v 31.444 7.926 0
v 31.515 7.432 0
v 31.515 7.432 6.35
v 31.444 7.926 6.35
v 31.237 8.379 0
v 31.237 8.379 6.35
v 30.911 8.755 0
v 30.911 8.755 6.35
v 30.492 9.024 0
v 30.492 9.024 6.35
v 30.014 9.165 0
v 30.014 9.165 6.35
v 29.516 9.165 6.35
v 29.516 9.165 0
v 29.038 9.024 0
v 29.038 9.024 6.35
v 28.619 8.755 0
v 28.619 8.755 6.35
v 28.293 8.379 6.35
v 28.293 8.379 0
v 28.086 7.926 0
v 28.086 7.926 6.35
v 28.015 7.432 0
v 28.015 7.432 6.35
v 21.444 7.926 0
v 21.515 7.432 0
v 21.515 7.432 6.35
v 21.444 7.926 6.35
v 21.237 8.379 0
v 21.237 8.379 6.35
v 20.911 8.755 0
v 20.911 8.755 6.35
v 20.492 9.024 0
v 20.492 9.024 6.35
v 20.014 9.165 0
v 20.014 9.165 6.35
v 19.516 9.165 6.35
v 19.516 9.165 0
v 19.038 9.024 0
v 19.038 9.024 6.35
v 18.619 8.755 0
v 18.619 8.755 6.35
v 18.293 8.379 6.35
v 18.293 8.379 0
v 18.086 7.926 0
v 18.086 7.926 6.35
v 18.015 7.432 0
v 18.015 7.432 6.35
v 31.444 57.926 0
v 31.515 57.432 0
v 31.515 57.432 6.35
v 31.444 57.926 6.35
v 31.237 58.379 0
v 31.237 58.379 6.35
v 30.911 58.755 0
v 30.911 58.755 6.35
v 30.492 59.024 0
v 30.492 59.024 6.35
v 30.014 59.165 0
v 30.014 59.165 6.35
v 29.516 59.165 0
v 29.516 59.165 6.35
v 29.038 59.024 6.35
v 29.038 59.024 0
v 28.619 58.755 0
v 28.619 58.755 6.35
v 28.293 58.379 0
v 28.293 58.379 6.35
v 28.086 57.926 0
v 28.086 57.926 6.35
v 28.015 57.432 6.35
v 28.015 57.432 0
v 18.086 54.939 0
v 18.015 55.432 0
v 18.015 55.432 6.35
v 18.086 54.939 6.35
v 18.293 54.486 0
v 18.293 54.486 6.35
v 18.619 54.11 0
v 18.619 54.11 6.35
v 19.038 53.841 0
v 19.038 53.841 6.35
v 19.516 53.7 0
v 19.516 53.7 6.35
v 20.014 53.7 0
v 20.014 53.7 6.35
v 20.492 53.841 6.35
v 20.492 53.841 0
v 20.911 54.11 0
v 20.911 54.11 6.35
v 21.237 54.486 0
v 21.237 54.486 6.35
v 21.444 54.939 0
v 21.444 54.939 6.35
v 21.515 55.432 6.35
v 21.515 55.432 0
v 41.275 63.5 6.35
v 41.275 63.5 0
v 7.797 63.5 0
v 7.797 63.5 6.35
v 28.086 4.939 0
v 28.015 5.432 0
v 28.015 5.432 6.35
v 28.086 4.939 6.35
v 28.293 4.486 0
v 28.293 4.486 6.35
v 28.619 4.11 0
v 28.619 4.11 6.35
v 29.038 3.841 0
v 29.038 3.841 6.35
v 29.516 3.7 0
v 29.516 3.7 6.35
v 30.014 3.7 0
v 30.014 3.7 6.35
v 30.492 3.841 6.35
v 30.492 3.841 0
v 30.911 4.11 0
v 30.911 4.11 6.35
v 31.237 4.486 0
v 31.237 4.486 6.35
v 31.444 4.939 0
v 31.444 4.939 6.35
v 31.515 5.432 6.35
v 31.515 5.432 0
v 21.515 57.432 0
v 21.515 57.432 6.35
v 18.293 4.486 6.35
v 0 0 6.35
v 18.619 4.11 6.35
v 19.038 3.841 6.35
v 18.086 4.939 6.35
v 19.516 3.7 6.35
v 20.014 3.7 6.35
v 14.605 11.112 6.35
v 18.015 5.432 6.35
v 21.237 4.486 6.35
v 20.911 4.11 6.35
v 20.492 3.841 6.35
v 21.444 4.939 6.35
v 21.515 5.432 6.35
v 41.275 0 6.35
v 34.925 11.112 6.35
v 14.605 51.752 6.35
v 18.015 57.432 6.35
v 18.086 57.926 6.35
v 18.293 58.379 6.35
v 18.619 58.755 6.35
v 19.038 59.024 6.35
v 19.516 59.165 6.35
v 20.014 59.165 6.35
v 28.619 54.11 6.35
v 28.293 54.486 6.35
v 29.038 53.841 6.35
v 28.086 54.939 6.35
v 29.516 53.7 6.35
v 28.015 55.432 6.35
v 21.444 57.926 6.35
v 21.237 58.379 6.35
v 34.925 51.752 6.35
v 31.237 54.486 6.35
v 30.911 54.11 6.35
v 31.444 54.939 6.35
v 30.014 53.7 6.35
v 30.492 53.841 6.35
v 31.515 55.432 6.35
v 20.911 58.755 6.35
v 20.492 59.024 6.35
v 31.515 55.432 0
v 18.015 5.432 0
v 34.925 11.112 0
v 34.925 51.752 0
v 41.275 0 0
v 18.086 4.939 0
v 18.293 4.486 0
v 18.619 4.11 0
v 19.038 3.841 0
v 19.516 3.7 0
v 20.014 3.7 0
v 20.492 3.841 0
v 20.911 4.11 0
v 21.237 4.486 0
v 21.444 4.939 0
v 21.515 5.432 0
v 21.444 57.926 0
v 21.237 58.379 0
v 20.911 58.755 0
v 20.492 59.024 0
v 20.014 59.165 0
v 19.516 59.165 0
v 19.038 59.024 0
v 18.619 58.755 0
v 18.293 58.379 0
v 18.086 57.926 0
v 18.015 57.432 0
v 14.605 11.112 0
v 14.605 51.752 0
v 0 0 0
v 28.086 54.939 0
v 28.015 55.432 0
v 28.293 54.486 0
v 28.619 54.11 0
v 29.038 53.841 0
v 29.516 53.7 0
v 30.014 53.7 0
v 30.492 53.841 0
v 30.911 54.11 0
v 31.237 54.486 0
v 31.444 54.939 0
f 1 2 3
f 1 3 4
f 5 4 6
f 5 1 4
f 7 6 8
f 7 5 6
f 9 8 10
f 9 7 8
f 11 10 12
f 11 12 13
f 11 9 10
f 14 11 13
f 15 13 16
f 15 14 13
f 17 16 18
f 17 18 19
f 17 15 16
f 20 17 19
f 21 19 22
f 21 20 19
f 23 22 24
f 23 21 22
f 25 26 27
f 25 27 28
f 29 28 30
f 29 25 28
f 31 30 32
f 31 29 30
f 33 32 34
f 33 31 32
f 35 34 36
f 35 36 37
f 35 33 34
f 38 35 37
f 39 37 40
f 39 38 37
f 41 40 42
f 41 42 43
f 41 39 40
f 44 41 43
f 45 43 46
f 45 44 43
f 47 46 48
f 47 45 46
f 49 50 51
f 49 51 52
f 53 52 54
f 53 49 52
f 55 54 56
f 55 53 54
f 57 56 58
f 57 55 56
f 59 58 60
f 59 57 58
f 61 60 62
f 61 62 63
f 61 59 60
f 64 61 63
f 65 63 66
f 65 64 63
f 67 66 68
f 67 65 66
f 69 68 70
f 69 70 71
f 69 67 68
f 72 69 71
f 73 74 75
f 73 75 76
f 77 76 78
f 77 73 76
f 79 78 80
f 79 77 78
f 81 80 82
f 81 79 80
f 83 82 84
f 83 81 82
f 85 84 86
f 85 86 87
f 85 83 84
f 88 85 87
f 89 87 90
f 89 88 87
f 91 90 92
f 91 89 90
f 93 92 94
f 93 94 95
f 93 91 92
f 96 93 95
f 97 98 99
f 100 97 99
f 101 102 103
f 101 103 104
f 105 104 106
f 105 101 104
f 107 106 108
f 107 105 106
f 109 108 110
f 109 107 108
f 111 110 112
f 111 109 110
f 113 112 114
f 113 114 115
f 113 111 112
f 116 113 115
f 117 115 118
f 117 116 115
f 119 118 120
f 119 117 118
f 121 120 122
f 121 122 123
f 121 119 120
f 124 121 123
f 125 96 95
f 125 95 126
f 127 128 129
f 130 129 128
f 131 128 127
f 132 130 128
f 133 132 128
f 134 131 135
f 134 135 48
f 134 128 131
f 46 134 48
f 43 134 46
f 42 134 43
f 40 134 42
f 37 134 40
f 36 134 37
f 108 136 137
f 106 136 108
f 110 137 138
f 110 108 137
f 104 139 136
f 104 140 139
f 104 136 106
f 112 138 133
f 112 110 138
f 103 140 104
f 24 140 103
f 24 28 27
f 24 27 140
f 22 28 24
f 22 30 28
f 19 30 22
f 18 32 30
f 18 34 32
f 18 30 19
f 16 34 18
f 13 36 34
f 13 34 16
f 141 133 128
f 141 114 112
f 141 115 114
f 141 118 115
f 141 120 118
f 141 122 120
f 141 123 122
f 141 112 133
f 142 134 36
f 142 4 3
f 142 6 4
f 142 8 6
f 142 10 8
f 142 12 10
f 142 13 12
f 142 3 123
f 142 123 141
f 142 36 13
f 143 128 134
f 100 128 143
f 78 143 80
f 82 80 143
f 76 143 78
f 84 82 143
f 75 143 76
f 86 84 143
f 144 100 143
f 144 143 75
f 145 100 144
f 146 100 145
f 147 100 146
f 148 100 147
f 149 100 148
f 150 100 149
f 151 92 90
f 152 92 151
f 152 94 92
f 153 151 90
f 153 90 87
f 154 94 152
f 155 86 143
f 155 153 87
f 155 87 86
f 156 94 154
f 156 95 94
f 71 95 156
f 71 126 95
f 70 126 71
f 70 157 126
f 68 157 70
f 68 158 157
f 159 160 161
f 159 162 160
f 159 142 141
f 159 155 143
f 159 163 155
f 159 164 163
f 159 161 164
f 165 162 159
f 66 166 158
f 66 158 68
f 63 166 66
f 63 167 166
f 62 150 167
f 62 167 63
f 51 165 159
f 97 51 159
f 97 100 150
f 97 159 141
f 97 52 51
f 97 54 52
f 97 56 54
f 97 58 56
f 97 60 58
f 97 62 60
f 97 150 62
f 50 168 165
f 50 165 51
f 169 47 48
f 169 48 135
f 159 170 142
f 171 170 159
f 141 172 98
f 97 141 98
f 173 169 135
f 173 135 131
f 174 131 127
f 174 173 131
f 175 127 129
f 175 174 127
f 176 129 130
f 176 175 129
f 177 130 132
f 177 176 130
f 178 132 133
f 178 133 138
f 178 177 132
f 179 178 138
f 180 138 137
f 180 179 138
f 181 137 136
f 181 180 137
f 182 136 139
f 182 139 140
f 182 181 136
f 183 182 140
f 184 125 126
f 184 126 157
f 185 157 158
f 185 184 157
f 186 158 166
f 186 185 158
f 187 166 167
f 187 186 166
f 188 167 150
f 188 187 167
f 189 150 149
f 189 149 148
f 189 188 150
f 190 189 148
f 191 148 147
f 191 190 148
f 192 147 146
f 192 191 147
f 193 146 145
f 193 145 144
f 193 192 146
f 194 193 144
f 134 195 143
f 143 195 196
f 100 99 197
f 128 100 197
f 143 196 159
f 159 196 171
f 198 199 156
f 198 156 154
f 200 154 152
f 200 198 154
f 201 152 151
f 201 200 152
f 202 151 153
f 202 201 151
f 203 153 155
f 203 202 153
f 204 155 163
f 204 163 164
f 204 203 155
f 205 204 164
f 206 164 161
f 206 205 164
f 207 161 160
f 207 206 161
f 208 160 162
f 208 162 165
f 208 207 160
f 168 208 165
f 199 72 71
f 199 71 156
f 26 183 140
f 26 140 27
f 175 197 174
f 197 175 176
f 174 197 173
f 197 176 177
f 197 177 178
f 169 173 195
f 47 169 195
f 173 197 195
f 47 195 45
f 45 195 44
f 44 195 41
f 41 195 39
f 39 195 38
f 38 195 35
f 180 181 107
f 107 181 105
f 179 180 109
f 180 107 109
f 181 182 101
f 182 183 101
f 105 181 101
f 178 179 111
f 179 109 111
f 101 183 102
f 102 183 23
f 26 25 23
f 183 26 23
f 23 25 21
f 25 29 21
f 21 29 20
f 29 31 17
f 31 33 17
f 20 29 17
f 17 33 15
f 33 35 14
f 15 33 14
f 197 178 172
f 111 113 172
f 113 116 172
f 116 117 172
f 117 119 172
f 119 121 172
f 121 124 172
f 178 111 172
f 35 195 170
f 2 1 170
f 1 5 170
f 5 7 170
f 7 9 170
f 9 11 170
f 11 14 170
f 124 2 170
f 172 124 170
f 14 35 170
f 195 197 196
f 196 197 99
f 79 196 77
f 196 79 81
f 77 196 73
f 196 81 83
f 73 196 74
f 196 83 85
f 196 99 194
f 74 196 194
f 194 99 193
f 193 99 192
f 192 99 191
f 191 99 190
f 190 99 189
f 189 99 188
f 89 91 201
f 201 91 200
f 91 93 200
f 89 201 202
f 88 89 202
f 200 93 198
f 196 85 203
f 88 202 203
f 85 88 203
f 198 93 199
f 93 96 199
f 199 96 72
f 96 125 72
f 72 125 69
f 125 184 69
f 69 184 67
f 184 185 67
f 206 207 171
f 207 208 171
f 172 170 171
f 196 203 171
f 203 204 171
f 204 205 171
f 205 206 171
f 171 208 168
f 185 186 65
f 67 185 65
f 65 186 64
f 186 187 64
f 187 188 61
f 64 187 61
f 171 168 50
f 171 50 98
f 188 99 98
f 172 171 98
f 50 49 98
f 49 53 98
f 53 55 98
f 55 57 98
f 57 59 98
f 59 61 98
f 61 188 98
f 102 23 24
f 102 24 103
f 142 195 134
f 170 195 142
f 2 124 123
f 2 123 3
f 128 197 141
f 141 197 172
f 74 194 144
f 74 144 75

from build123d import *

# Parameters (mm, degrees)
SKETCH1_W           = 20.32
SKETCH1_H           = 40.64
BOSS_EXTRUDE1_DEPTH = 6.35


with BuildPart() as part:
    # Sketch1 → Boss-Extrude1 (new body)
    with BuildSketch(Plane.XY):
        Polygon((0, 0), (41.275, 0), (41.275, 63.5), (7.796819617, 63.5), align=None)
        with BuildLine():
            ThreePointArc((28.015, 5.4325), (29.765, 3.6825), (31.515, 5.4325))
            Line((31.515, 5.4325), (31.515, 7.4325))
            ThreePointArc((31.515, 7.4325), (29.765, 9.1825), (28.015, 7.4325))
            Line((28.015, 7.4325), (28.015, 5.4325))
        make_face(mode=Mode.SUBTRACT)
        with BuildLine():
            ThreePointArc((18.015, 5.4325), (19.765, 3.6825), (21.515, 5.4325))
            Line((21.515, 5.4325), (21.515, 7.4325))
            ThreePointArc((21.515, 7.4325), (19.765, 9.1825), (18.015, 7.4325))
            Line((18.015, 7.4325), (18.015, 5.4325))
        make_face(mode=Mode.SUBTRACT)
        with BuildLine():
            ThreePointArc((31.515, 57.4325), (29.765, 59.1825), (28.015, 57.4325))
            Line((28.015, 57.4325), (28.015, 55.4325))
            ThreePointArc((28.015, 55.4325), (29.765, 53.6825), (31.515, 55.4325))
            Line((31.515, 55.4325), (31.515, 57.4325))
        make_face(mode=Mode.SUBTRACT)
        with BuildLine():
            ThreePointArc((21.515, 57.4325), (19.765, 59.1825), (18.015, 57.4325))
            Line((18.015, 57.4325), (18.015, 55.4325))
            ThreePointArc((18.015, 55.4325), (19.765, 53.6825), (21.515, 55.4325))
            Line((21.515, 55.4325), (21.515, 57.4325))
        make_face(mode=Mode.SUBTRACT)
        with Locations((24.765, 31.4325)):
            Rectangle(SKETCH1_W, SKETCH1_H, mode=Mode.SUBTRACT)
    extrude(amount=BOSS_EXTRUDE1_DEPTH)


solid = part.part
